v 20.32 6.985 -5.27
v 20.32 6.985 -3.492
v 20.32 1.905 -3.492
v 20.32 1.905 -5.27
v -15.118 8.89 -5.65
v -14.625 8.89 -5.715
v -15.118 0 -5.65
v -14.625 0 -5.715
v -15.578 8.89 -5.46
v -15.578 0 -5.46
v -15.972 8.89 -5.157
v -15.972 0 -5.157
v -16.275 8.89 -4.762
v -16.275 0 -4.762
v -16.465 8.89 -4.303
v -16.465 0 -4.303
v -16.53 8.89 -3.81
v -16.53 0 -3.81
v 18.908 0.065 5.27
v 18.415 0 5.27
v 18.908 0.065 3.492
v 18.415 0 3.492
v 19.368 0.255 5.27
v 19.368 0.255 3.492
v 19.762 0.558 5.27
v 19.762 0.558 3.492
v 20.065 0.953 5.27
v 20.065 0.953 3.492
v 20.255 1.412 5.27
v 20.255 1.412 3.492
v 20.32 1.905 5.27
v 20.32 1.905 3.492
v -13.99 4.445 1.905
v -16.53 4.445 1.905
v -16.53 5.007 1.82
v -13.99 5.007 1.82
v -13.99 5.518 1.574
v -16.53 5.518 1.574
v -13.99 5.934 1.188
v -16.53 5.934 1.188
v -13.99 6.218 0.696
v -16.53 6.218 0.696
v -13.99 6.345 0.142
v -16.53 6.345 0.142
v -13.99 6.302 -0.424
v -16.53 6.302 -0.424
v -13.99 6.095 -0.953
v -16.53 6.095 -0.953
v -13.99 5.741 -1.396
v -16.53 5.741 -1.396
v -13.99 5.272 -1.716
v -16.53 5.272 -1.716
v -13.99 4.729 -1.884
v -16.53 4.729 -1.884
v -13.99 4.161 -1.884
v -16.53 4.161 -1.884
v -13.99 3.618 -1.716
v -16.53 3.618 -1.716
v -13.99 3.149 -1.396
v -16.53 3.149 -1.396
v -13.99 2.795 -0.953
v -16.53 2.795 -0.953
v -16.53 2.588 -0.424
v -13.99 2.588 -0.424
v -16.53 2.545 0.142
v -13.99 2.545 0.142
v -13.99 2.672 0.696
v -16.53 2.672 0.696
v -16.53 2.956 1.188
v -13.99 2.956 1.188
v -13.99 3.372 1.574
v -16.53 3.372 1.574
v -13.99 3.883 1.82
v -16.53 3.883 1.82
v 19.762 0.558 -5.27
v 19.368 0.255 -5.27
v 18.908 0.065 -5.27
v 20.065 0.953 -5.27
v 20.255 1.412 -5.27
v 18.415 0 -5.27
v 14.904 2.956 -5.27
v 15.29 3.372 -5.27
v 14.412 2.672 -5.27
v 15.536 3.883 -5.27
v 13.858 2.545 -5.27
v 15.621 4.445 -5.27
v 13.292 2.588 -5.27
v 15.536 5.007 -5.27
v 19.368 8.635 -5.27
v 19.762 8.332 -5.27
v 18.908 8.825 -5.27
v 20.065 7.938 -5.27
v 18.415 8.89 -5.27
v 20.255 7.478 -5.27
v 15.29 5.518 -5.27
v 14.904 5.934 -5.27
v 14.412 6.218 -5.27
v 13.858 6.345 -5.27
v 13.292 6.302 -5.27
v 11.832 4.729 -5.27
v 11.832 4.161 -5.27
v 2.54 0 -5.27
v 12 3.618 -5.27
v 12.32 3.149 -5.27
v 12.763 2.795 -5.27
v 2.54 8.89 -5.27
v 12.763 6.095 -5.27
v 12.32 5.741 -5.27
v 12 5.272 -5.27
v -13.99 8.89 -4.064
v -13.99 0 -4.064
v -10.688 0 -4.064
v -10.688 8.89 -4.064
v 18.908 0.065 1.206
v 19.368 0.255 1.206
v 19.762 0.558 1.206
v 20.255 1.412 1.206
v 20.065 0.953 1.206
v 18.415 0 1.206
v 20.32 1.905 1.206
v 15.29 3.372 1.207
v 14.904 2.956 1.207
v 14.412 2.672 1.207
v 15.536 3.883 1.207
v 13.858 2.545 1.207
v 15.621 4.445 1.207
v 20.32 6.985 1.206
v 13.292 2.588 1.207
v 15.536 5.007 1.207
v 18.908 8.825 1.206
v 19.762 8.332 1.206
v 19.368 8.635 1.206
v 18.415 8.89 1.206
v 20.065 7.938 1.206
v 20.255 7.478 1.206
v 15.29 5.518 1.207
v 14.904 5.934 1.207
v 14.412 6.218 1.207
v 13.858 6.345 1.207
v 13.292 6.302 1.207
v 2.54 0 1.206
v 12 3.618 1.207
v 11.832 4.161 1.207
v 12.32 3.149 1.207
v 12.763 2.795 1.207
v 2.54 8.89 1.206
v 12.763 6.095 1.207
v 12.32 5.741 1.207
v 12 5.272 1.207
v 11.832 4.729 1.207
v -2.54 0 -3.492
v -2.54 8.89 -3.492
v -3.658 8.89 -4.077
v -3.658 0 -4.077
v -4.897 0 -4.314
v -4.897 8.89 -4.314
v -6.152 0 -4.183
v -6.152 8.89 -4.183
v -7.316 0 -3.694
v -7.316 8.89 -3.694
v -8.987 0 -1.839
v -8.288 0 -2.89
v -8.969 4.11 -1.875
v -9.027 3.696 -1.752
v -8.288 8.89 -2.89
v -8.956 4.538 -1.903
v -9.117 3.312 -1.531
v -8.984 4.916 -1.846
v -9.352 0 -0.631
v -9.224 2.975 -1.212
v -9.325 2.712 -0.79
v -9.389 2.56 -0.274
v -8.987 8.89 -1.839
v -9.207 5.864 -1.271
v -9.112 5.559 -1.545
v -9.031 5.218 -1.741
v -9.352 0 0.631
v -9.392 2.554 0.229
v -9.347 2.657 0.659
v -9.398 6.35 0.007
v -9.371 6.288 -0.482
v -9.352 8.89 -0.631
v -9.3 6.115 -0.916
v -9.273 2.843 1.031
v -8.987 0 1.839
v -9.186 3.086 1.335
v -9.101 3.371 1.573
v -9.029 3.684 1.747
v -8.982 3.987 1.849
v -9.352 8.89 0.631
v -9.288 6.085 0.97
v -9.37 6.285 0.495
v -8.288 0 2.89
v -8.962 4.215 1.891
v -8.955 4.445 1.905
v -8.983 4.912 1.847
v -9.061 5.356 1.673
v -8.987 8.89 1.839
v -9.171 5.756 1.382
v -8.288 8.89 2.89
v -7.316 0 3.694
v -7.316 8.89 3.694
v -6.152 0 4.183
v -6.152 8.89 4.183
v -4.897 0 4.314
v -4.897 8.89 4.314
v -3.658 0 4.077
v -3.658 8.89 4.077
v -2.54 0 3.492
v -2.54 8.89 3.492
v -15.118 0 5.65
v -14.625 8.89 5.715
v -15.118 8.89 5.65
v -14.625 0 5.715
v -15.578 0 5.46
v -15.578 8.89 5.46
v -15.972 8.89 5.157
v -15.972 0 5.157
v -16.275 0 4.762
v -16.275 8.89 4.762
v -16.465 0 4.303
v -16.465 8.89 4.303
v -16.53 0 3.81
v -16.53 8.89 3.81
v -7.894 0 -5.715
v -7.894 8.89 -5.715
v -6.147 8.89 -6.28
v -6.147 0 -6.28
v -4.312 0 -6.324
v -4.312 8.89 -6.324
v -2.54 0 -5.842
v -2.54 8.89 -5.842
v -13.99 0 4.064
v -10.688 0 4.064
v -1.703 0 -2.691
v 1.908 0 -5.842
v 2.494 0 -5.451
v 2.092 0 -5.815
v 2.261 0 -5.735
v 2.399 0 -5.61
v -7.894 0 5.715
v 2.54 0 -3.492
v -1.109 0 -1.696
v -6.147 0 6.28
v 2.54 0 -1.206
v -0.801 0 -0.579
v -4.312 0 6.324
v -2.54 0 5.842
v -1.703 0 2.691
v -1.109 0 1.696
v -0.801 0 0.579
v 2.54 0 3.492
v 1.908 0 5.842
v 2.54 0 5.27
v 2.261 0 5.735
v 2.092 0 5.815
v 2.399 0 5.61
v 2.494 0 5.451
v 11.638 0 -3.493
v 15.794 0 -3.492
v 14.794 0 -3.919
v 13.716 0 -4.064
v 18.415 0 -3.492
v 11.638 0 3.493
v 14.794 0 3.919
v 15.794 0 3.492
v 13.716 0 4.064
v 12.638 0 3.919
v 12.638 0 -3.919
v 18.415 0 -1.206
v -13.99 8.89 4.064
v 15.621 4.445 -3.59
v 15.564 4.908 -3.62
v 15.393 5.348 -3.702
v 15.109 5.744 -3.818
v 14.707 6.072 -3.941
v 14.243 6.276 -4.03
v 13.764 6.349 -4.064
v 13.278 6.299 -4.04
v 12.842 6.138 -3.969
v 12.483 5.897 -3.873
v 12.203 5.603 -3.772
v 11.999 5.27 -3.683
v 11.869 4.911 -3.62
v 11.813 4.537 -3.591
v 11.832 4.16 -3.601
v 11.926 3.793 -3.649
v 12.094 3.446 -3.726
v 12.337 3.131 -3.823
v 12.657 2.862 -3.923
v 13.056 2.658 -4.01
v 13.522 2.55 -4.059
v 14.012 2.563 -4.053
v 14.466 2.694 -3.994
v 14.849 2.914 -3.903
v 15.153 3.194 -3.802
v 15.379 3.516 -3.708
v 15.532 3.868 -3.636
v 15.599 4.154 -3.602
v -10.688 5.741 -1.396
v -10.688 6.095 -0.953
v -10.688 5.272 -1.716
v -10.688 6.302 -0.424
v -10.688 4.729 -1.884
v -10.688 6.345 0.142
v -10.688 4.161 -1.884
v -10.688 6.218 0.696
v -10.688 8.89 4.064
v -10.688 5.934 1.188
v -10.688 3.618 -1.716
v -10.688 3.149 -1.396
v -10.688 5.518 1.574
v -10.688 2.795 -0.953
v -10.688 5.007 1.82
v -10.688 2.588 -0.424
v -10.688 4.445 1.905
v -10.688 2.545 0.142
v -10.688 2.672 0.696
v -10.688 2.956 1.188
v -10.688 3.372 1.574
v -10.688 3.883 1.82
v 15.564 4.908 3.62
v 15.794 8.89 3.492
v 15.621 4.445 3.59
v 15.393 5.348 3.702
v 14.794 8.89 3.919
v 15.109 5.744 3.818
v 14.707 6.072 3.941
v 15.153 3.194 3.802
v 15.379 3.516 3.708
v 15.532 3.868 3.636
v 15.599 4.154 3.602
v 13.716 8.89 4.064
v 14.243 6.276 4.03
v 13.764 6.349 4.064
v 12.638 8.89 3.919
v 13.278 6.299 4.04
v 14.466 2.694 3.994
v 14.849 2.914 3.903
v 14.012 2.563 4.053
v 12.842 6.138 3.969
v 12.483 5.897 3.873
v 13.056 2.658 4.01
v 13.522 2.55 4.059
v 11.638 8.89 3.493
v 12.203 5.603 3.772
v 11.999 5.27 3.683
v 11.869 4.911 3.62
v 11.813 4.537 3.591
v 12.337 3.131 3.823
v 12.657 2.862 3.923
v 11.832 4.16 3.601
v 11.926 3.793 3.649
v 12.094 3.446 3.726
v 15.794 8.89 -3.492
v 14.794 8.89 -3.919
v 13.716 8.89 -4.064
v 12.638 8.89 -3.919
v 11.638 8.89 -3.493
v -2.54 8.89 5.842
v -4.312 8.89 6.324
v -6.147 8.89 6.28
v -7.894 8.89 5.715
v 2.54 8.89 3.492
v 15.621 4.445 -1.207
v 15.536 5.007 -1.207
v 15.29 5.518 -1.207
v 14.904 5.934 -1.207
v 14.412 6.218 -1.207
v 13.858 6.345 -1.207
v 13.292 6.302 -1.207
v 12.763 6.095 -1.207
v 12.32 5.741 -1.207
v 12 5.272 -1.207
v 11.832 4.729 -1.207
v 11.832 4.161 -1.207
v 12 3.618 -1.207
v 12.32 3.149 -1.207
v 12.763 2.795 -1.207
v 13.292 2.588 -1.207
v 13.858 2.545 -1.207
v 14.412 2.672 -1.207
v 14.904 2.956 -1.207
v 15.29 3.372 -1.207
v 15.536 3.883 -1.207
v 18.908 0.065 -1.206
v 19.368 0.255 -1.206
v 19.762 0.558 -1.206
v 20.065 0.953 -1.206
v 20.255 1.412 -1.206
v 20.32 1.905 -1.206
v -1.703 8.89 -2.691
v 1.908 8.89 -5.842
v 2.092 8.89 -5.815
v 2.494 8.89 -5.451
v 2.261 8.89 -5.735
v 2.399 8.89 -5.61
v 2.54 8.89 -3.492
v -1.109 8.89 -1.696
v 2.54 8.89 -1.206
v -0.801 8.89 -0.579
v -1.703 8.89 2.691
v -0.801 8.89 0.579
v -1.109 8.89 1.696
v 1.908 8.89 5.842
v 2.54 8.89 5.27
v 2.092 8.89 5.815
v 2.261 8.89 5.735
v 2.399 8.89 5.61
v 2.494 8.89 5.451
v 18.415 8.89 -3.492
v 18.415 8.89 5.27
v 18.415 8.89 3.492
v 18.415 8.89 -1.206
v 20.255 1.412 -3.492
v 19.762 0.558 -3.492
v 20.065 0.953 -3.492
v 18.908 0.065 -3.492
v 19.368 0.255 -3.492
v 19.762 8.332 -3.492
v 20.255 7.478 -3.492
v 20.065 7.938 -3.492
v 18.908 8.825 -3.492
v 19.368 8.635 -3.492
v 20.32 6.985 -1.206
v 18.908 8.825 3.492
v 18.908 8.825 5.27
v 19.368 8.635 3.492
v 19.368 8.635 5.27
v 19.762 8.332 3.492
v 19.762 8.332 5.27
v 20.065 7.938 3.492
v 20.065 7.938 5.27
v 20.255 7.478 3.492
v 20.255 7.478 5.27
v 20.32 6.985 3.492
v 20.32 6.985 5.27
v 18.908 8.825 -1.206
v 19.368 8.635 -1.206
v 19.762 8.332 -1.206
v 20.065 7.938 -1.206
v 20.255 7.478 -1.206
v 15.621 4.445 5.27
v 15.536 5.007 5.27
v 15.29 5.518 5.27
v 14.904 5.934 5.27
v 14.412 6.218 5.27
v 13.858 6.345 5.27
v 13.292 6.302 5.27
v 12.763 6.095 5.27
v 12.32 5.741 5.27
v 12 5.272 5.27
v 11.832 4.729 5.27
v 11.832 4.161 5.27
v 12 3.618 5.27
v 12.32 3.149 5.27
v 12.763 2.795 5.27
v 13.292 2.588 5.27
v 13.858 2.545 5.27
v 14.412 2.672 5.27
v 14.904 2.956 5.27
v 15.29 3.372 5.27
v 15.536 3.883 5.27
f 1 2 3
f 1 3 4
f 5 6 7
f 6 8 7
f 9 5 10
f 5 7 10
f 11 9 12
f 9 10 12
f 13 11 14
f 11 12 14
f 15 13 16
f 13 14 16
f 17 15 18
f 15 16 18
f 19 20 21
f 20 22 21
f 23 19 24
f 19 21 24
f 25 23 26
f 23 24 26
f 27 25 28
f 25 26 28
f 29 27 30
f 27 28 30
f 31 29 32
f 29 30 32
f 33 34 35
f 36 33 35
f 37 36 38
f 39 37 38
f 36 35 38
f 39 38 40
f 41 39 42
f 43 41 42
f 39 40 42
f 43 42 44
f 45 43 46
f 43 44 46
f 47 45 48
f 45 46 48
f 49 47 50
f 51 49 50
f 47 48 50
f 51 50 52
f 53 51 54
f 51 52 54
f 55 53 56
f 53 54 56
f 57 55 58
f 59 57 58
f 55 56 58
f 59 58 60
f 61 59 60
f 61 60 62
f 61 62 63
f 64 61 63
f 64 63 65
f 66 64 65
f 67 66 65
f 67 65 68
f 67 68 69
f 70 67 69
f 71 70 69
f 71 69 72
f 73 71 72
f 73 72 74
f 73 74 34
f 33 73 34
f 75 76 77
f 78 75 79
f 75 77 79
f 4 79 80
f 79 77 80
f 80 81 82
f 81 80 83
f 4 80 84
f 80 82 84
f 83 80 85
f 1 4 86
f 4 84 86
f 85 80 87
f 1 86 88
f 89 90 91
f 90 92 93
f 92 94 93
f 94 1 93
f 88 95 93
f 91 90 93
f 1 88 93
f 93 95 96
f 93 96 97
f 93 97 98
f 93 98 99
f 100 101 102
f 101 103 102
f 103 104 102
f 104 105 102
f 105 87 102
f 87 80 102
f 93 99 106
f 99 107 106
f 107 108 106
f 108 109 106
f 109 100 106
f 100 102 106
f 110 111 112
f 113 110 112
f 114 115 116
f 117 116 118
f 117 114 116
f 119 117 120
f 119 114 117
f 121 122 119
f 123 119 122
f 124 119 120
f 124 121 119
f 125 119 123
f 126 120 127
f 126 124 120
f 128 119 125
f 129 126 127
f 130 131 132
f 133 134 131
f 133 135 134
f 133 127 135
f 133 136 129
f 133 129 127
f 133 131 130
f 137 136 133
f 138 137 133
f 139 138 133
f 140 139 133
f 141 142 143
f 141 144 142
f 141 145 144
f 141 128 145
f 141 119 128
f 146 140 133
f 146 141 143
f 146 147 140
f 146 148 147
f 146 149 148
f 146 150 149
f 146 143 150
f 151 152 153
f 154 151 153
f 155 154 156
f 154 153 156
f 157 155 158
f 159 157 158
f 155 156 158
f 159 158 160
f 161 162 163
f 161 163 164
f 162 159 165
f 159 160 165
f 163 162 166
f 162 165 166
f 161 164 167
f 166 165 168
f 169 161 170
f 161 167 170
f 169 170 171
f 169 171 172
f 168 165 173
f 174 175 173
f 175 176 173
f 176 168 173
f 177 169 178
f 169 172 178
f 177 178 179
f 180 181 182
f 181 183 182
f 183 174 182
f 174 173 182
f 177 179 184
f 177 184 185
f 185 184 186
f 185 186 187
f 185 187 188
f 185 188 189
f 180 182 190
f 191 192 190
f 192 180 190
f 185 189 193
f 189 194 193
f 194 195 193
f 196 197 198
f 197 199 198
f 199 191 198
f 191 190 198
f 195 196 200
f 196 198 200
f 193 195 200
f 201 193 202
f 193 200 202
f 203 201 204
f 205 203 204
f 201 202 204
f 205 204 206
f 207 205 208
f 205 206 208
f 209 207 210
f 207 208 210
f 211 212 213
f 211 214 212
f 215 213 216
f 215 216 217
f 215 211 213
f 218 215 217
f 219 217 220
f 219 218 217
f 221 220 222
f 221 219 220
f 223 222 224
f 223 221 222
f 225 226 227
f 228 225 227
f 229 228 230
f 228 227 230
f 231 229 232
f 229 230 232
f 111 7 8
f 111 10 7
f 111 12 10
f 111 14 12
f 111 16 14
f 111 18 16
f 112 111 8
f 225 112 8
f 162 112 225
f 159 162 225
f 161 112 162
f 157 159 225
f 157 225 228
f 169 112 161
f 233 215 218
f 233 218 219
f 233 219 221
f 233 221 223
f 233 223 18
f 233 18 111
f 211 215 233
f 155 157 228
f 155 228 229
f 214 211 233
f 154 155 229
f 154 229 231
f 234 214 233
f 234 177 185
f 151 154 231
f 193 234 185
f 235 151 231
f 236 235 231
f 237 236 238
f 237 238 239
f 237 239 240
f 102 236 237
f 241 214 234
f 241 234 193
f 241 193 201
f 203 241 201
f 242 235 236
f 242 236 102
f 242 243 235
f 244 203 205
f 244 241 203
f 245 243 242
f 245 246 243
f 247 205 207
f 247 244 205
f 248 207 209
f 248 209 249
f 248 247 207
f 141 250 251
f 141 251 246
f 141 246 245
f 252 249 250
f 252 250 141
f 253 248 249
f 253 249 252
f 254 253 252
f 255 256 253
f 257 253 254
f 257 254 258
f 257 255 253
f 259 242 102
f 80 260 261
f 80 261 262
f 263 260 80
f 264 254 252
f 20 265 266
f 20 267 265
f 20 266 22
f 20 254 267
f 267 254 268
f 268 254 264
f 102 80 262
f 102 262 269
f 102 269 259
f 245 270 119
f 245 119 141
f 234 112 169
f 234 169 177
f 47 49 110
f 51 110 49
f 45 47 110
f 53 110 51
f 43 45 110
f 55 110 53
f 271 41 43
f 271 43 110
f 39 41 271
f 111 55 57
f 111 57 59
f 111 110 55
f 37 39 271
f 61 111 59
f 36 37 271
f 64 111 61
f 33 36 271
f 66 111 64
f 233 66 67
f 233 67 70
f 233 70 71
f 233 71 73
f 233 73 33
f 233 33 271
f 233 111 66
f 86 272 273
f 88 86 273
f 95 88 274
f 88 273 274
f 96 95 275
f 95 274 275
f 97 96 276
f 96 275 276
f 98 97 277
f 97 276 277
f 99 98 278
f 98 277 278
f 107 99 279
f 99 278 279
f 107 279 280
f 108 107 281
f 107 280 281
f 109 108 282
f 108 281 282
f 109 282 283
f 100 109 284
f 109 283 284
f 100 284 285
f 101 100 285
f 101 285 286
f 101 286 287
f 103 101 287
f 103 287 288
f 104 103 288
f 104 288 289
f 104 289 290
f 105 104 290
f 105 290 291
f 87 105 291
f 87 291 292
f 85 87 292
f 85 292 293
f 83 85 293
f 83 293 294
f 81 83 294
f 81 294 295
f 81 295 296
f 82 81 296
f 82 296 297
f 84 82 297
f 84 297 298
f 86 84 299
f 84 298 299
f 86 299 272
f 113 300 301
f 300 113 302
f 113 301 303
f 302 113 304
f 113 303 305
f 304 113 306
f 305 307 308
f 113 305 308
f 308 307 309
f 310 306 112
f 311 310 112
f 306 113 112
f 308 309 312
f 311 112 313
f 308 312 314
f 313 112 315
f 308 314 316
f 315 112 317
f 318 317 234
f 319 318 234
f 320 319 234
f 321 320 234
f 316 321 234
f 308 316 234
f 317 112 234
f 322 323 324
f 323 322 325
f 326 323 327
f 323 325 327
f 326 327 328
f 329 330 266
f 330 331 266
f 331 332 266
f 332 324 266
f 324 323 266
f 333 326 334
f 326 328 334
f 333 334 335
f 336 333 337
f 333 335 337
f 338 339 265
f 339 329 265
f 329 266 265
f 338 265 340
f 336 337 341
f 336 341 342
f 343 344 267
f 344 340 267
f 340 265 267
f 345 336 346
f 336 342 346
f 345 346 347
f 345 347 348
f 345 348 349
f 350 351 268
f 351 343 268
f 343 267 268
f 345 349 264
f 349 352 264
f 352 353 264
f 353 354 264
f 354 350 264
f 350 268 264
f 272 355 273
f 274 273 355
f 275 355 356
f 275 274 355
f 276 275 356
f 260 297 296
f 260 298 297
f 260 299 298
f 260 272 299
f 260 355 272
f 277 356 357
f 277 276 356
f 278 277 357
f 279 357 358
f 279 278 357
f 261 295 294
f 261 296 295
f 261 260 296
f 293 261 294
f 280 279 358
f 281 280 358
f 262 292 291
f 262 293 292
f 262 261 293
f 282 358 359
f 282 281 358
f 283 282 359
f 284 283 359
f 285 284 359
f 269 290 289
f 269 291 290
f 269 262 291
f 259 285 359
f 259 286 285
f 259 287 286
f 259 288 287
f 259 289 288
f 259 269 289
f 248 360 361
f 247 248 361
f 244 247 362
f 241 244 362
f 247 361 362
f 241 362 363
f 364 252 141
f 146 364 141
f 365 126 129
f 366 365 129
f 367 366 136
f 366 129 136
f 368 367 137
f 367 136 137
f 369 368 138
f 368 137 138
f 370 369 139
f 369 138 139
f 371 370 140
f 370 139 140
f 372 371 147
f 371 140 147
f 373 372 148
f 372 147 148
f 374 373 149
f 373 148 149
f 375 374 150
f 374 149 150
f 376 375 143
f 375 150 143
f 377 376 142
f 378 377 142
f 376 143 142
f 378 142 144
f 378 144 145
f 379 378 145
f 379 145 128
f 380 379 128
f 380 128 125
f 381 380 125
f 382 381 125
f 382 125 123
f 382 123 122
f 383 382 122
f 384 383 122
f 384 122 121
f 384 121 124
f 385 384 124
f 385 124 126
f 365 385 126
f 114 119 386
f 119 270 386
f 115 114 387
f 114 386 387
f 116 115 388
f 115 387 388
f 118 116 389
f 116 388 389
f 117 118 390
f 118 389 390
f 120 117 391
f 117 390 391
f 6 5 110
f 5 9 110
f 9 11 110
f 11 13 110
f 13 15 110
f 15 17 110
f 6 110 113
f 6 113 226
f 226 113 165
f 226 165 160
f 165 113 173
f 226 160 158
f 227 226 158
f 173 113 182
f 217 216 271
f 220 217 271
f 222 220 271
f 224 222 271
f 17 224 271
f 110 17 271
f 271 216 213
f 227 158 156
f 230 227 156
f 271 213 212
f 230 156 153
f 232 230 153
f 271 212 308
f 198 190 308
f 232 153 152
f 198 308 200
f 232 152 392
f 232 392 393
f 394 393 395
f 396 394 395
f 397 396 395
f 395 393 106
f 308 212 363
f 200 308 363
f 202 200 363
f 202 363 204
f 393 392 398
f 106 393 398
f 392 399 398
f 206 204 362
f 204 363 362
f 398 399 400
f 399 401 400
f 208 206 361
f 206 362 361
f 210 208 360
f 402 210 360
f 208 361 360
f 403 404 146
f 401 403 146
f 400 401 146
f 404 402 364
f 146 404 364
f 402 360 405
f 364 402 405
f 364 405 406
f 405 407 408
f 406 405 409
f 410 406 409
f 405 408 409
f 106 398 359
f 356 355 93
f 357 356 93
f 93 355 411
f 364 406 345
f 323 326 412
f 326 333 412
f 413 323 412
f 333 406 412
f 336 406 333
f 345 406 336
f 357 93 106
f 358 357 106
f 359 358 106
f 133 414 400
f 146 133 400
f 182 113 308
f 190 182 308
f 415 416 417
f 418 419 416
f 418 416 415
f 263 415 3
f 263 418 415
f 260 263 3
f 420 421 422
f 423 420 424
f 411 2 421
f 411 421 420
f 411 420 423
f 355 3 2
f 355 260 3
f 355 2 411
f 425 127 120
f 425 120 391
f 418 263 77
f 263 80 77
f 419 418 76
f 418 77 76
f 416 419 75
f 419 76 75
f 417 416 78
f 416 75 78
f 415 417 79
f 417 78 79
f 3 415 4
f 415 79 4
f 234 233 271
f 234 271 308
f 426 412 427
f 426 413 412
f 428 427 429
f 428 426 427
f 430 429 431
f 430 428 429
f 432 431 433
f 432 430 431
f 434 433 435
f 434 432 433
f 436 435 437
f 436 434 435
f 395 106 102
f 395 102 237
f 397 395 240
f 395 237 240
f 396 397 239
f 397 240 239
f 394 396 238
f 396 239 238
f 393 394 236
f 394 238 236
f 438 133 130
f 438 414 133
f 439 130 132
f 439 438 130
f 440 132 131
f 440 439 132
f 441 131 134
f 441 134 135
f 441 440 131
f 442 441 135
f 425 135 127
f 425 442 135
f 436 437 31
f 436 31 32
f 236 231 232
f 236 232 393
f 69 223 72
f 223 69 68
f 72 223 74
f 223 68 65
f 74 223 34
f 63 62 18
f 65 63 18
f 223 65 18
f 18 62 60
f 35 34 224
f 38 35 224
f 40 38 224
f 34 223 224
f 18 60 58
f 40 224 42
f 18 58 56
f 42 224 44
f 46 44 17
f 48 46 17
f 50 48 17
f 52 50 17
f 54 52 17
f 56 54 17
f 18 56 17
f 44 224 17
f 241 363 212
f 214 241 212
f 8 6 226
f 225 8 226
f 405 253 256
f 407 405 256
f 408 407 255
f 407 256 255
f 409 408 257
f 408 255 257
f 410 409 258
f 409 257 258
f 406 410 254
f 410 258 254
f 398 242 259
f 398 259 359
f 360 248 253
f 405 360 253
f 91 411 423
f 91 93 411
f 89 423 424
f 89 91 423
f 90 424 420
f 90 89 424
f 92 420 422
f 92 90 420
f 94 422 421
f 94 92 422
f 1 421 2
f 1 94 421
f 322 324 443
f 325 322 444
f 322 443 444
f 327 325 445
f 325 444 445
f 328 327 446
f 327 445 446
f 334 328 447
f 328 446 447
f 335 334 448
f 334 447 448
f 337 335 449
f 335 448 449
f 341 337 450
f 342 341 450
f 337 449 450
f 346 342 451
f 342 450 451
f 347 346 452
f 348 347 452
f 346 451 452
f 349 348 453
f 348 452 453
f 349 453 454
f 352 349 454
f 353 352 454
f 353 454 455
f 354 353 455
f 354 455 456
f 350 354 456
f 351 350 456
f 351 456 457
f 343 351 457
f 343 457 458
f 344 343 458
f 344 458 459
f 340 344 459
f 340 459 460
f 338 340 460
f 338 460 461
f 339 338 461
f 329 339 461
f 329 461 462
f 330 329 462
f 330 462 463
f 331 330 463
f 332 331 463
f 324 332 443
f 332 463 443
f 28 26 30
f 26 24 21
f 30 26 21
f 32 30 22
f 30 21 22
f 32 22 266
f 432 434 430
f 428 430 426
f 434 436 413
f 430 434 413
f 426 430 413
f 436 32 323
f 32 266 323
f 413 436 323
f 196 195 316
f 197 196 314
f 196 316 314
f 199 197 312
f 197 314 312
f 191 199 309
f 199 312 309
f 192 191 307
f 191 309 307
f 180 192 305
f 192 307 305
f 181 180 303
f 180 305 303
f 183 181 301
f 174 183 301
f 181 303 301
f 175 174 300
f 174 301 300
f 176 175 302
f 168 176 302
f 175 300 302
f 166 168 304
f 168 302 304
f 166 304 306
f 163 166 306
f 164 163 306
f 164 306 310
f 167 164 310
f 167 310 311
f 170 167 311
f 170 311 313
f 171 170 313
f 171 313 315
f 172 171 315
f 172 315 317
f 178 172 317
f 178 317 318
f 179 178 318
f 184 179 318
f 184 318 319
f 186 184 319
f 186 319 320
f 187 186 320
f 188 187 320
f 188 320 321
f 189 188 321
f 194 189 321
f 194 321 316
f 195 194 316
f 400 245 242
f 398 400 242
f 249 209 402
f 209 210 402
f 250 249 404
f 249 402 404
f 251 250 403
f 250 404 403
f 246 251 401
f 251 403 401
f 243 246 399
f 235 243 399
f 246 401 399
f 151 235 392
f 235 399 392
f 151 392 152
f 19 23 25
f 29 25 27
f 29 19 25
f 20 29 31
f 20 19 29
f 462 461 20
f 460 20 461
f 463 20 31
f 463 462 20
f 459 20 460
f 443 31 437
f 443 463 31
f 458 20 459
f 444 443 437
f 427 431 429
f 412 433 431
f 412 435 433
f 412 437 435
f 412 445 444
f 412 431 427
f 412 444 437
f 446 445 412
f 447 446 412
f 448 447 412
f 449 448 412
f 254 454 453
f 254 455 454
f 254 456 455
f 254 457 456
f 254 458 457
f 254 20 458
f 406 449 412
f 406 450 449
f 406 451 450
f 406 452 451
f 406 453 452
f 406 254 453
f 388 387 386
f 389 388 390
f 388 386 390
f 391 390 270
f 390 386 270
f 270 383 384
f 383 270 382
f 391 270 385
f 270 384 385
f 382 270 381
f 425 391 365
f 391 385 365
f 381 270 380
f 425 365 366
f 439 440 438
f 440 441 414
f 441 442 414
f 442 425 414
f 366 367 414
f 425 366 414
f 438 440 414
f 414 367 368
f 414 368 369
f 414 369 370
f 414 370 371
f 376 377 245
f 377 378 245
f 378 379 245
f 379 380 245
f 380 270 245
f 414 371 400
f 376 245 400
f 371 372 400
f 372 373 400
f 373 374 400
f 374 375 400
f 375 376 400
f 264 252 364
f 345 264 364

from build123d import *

# Parameters (mm, degrees)
SKETCH1_W               = 5.08
SKETCH1_H               = 11.684
BOSS_EXTRUDE1_DEPTH     = 8.89
SKETCH2_R               = 4.318
CUT_EXTRUDE1_DEPTH      = 8.89
BOSS_EXTRUDE4_START     = -8.89
BOSS_EXTRUDE4_DEPTH     = 8.89
BOSS_EXTRUDE5_START     = -8.89
BOSS_EXTRUDE5_DEPTH     = 8.89
SKETCH9_W               = 3.302
SKETCH9_H               = 8.128
CUT_EXTRUDE4_DEPTH      = 8.89
CUT_EXTRUDE5_REACH      = 23.984
CUT_EXTRUDE5_END_RADIUS = 4.318
SKETCH10_R              = 1.905
SKETCH11_W              = 2.413
SKETCH11_H              = 8.89
SKETCH11_W_2            = 1.778
BOSS_EXTRUDE6_DEPTH     = 17.78
CUT_EXTRUDE6_REACH      = 27.049
SKETCH12_R              = 1.905
CUT_EXTRUDE7_START      = -8.89
CUT_EXTRUDE7_DEPTH      = 8.89
FILLET3_R               = 0.635
FILLET4_R               = 1.905


with BuildPart() as part:
    # Sketch1 → Boss-Extrude1 (new body)
    with BuildSketch(Plane(origin=(0, 0, 0), x_dir=(1, 0, 0), z_dir=(0, 1, 0))):
        Rectangle(SKETCH1_W, SKETCH1_H)
    extrude(amount=BOSS_EXTRUDE1_DEPTH)

    # Sketch2 → Cut-Extrude1 (cut)
    with BuildSketch(Plane(origin=(0, 8.89, 0), x_dir=(1, 0, 0), z_dir=(0, 1, 0))):
        with Locations((-5.08, 0)):
            Circle(SKETCH2_R)
    extrude(amount=-CUT_EXTRUDE1_DEPTH, mode=Mode.SUBTRACT)

    # Sketch7 → Boss-Extrude4 (add)
    with BuildSketch(Plane.XZ.offset(BOSS_EXTRUDE4_START)):
        with BuildLine():
            Line((-2.54, 3.49192268), (-2.54, 5.842))
            ThreePointArc((-2.54, 5.842), (-11.450287592, 0), (-2.54, -5.842))
            Line((-2.54, -5.842), (-2.54, -3.49192268))
            ThreePointArc((-2.54, -3.49192268), (-9.398, 0), (-2.54, 3.49192268))
        make_face()
    extrude(amount=BOSS_EXTRUDE4_DEPTH)

    # Sketch8 → Boss-Extrude5 (add)
    with BuildSketch(Plane.XZ.offset(BOSS_EXTRUDE5_START)):
        with BuildLine():
            Line((-7.894132015, 5.715), (-16.530287592, 5.715))
            Line((-16.530287592, 5.715), (-16.530287592, -5.715))
            Line((-16.530287592, -5.715), (-7.894132015, -5.715))
            ThreePointArc((-7.894132015, -5.715), (-11.450287592, 0), (-7.894132015, 5.715))
        make_face()
    extrude(amount=BOSS_EXTRUDE5_DEPTH)

    # Sketch9 → Cut-Extrude4 (cut)
    with BuildSketch(Plane.XZ):
        with Locations((-12.339287592, 0)):
            Rectangle(SKETCH9_W, SKETCH9_H)
    extrude(amount=-CUT_EXTRUDE4_DEPTH, mode=Mode.SUBTRACT)

    # Cut-Extrude5: up to this cylinder (the profile starts outside it)
    cut_extrude5_end = Plane(origin=(-5.08, 4.445, 0), z_dir=(0, 1, 0)) * Cylinder(CUT_EXTRUDE5_END_RADIUS, 57.604, mode=Mode.PRIVATE)
    # Sketch10 → Cut-Extrude5 (cut, up to the surface)
    with BuildSketch(Plane.ZY.offset(16.530287592), mode=Mode.PRIVATE) as cut_extrude5_sk1:
        with Locations((0, 4.445)):
            Circle(SKETCH10_R)
    cut_extrude5_tool1 = extrude(cut_extrude5_sk1.sketch, amount=-CUT_EXTRUDE5_REACH, mode=Mode.PRIVATE) - cut_extrude5_end
    add(cut_extrude5_tool1.solids().sort_by_distance((-16.530288, 4.445, 0))[0], mode=Mode.SUBTRACT)

    # Sketch11 → Boss-Extrude6 (add)
    with BuildSketch(Plane(origin=(2.54, 0, 0), x_dir=(0, 0, -1), z_dir=(1, 0, 0))):
        with Locations((0, 4.445)):
            Rectangle(SKETCH11_W, SKETCH11_H)
        with Locations((4.3815, 4.445)):
            Rectangle(SKETCH11_W_2, SKETCH11_H)
        with Locations((-4.3815, 4.445)):
            Rectangle(SKETCH11_W_2, SKETCH11_H)
    extrude(amount=BOSS_EXTRUDE6_DEPTH)

    # Cut-Extrude6: up to this face of the body (flat: up to its plane)
    cut_extrude6_end = Plane(part.part.faces().sort_by_distance((11.43, 4.445, -5.2705))[0])
    # Sketch12 → Cut-Extrude6 (cut, up to the picked face)
    with BuildSketch(Plane.XY.offset(5.2705), mode=Mode.PRIVATE) as cut_extrude6_sk1:
        with Locations((13.716, 4.445)):
            Circle(SKETCH12_R)
    cut_extrude6_tool1 = split(extrude(cut_extrude6_sk1.sketch, amount=-CUT_EXTRUDE6_REACH, mode=Mode.PRIVATE), bisect_by=cut_extrude6_end, keep=Keep.BOTH, mode=Mode.PRIVATE)
    add(cut_extrude6_tool1.solids().sort_by(Axis((13.716, 4.445, 5.2705), (0, 0, -1)))[0], mode=Mode.SUBTRACT)

    # Sketch13 → Cut-Extrude7 (cut)
    with BuildSketch(Plane(origin=(0, 8.89, 0), x_dir=(1, 0, 0), z_dir=(0, 1, 0)).offset(CUT_EXTRUDE7_START)):
        with BuildLine():
            Line((11.637890342, 3.4925), (15.794109658, 3.4925))
            ThreePointArc((15.794109658, 3.4925), (13.716, 4.064), (11.637890342, 3.4925))
        make_face()
        with BuildLine():
            Line((11.637890342, -3.4925), (15.794109658, -3.4925))
            ThreePointArc((15.794109658, -3.4925), (13.716, -4.064), (11.637890342, -3.4925))
        make_face()
    extrude(amount=CUT_EXTRUDE7_DEPTH, mode=Mode.SUBTRACT)

    # Fillet3
    # the kernel refuses this fillet: 0.635 mm, written as the material it takes off along each edge
    with BuildSketch(Plane(origin=(2.54, -1.579542556, -5.842), x_dir=(-1, 0, 0), z_dir=(0, 1, 0))) as fillet3_piece_1:
        with BuildLine():
            CenterArc((0.631817023, 0.635), FILLET3_R, 185.739170477, 84.260829523)
            Line((0, 0.5715), (-0.01263634, 0.57023))
            ThreePointArc((-0.01263634, 0.57023), (-0.0127, 0.28575), (-0.0127, 0))
            Line((-0.0127, 0), (0, -0.0127))
            Line((0, -0.0127), (0.631817023, -0.0127))
            Line((0.631817023, -0.0127), (0.631817023, 0))
        make_face()
    extrude(amount=12.049085113, mode=Mode.SUBTRACT)
    with BuildSketch(Plane(origin=(2.54, -1.579542556, 5.842), x_dir=(-1, 0, 0), z_dir=(0, 1, 0))) as fillet3_piece_2:
        with BuildLine():
            CenterArc((0.631817023, -0.635), FILLET3_R, 90, 84.260829523)
            Line((0, -0.5715), (-0.01263634, -0.57023))
            ThreePointArc((-0.01263634, -0.57023), (-0.0127, -0.28575), (-0.0127, 0))
            Line((-0.0127, 0), (0, 0.0127))
            Line((0, 0.0127), (0.631817023, 0.0127))
            Line((0.631817023, 0.0127), (0.631817023, 0))
        make_face()
    extrude(amount=12.049085113, mode=Mode.SUBTRACT)

    # Fillet4
    fillet4_edges = [part.edges().sort_by_distance(p)[0] for p in [
        (-16.530287592, 4.445, 5.715),
        (-16.530287592, 4.445, -5.715),
        (20.32, 0, 0),
        (20.32, 8.89, 0),
        (20.32, 8.89, -4.3815),
        (20.32, 0, -4.3815),
        (20.32, 0, 4.3815),
        (20.32, 8.89, 4.3815),
    ]]
    fillet(fillet4_edges, radius=FILLET4_R)


solid = part.part
